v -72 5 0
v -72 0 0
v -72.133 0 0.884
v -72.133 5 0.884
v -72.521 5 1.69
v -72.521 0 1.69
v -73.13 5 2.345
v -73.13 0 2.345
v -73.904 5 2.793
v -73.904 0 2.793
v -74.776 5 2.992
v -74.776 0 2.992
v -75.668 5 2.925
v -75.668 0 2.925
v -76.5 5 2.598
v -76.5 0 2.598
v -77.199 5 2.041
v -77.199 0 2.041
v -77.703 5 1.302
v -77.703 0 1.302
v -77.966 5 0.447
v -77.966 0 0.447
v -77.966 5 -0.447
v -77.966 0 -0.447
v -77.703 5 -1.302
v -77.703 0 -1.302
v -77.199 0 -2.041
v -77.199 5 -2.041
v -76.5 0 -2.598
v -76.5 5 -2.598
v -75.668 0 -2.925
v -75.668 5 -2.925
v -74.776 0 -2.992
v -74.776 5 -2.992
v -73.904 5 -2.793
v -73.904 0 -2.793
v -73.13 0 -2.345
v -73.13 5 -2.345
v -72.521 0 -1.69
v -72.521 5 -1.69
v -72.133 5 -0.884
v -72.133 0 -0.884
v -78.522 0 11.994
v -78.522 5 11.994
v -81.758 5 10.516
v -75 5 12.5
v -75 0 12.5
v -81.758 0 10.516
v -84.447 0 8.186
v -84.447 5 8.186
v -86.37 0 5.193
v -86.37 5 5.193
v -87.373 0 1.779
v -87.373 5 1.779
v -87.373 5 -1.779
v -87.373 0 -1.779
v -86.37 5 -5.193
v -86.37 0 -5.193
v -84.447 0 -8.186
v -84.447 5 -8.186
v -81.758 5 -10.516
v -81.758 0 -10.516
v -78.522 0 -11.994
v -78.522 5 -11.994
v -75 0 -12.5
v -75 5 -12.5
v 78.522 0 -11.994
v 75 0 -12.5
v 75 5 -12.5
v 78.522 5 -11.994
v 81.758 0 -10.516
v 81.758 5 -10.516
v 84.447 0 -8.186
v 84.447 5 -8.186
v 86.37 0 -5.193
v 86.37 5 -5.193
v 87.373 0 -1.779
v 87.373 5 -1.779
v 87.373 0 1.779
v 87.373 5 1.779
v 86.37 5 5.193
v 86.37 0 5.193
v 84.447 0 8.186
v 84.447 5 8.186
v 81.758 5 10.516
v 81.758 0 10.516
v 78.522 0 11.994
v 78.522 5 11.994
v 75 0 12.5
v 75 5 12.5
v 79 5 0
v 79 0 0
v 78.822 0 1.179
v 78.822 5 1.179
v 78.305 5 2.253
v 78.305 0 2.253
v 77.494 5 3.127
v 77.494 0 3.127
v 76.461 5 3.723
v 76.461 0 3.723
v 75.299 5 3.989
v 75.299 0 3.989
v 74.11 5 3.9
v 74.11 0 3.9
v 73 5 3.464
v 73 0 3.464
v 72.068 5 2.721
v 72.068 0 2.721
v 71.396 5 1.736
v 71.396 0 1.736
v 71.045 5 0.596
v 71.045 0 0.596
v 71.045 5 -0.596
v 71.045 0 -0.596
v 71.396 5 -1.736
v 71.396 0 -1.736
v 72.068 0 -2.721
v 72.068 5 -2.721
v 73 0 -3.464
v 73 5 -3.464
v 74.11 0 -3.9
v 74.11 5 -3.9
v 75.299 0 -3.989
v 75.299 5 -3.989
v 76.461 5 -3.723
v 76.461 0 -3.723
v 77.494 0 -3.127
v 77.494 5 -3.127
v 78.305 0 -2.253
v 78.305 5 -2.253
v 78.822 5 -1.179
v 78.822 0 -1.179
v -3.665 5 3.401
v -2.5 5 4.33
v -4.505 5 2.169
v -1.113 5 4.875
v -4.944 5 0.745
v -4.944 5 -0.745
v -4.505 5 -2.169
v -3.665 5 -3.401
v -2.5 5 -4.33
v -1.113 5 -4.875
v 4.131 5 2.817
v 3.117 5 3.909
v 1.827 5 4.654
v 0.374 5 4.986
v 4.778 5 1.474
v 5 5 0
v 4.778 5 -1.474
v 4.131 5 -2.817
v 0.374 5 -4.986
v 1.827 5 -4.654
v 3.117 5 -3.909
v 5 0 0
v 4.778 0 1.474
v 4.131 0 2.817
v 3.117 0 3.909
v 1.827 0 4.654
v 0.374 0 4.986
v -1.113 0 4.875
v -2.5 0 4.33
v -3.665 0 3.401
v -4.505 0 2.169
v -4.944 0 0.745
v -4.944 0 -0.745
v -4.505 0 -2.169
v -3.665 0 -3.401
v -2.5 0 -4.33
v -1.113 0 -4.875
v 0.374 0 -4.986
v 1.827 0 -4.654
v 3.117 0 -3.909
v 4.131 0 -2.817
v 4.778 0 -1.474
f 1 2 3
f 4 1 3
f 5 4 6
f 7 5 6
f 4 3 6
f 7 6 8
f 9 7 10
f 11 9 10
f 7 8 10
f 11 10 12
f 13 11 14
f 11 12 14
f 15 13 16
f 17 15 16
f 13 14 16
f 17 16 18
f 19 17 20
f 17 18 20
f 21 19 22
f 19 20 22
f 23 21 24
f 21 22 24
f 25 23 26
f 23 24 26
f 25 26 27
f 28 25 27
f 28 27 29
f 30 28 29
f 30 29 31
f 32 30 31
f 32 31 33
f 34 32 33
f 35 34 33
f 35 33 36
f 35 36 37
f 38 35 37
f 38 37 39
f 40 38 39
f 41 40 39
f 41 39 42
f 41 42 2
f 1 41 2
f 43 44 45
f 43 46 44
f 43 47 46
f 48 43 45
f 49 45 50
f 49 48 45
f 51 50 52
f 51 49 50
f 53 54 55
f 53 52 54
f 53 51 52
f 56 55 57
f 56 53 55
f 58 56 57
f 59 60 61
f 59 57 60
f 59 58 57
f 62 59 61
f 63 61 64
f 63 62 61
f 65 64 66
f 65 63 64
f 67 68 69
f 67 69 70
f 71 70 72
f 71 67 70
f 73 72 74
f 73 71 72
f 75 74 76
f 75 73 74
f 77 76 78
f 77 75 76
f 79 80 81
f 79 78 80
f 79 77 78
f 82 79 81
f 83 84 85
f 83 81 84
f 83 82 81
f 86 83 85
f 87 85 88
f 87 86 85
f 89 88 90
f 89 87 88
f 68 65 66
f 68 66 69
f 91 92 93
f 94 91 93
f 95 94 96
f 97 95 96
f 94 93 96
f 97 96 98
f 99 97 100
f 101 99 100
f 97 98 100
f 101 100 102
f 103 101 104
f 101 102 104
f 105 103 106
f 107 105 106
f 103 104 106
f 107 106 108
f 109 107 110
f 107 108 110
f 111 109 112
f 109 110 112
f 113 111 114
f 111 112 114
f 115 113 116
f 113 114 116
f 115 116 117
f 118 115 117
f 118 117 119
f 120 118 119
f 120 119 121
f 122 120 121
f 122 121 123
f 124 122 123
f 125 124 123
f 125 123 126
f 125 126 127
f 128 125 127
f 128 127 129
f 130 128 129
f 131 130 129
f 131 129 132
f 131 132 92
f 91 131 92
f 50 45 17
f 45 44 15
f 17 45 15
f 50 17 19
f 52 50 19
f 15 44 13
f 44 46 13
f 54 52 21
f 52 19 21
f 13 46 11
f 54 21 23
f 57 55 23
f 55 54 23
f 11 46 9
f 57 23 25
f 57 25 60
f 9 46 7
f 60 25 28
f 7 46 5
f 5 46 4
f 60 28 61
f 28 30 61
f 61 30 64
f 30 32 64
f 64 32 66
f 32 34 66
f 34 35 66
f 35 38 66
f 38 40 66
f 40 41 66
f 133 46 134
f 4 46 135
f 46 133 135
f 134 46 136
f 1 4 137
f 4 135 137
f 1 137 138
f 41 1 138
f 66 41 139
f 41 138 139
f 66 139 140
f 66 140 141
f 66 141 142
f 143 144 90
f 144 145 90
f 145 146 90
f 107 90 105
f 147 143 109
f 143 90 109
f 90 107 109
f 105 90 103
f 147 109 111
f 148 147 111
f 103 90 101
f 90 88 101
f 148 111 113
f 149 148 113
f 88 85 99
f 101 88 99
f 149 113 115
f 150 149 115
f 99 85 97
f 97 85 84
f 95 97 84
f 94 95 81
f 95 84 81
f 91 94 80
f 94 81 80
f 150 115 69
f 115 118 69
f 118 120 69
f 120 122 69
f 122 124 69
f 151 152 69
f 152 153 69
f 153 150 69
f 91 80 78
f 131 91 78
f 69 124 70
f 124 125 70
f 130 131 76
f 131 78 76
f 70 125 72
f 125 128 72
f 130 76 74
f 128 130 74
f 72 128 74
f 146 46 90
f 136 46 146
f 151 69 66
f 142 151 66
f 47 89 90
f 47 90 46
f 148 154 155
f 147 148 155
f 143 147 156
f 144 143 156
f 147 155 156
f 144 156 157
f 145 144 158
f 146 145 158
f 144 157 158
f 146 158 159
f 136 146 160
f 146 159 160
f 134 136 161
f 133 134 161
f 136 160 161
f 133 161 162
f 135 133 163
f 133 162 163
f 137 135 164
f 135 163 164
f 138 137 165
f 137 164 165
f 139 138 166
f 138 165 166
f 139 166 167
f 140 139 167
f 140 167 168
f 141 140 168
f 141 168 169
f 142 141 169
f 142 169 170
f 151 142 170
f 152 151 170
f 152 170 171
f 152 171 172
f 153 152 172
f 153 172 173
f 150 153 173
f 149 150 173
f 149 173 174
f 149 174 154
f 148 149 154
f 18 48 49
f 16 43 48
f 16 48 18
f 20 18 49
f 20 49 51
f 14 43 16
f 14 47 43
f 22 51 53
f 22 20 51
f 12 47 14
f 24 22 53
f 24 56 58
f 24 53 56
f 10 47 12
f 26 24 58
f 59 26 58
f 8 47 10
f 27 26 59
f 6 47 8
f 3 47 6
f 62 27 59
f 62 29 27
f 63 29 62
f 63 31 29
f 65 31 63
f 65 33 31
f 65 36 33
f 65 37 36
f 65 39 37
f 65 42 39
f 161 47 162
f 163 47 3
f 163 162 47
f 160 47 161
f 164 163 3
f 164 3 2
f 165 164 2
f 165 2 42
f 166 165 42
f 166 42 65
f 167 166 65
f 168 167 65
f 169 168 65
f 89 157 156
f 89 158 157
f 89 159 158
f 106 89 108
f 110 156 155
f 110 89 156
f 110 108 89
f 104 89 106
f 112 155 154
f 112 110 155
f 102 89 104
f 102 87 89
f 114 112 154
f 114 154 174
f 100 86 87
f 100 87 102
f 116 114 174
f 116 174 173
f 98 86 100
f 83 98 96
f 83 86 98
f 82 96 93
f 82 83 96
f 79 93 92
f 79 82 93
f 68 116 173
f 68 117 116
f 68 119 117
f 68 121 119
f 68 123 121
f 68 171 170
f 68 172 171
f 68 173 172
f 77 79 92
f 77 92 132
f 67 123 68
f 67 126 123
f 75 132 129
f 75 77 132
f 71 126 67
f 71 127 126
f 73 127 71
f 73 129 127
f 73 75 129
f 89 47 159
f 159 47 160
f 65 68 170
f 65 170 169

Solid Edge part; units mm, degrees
sketch "Sketch1" plane through (0, 0, 0) normal (0, -1, 0) x (1, 0, 0)
  line L0 (75, 12.5) -> (-75, 12.5)
  line L1 (-75, -12.5) -> (75, -12.5)
  arc A0 (-75, -12.5) -> (-75, 12.5) centre (-75, 0) cw
  arc A1 (75, 12.5) -> (75, -12.5) centre (75, 0) cw
  circle A2 centre (-75, 0) radius 3
  circle A3 centre (75, 0) radius 4
  circle A4 centre (0, 0) radius 5
extrude "ExtrudedProtrusion_2" add sketch "Sketch1" against normal blind 5
properties material "Polycarbonate( 20-40% Glass Fiber)"
